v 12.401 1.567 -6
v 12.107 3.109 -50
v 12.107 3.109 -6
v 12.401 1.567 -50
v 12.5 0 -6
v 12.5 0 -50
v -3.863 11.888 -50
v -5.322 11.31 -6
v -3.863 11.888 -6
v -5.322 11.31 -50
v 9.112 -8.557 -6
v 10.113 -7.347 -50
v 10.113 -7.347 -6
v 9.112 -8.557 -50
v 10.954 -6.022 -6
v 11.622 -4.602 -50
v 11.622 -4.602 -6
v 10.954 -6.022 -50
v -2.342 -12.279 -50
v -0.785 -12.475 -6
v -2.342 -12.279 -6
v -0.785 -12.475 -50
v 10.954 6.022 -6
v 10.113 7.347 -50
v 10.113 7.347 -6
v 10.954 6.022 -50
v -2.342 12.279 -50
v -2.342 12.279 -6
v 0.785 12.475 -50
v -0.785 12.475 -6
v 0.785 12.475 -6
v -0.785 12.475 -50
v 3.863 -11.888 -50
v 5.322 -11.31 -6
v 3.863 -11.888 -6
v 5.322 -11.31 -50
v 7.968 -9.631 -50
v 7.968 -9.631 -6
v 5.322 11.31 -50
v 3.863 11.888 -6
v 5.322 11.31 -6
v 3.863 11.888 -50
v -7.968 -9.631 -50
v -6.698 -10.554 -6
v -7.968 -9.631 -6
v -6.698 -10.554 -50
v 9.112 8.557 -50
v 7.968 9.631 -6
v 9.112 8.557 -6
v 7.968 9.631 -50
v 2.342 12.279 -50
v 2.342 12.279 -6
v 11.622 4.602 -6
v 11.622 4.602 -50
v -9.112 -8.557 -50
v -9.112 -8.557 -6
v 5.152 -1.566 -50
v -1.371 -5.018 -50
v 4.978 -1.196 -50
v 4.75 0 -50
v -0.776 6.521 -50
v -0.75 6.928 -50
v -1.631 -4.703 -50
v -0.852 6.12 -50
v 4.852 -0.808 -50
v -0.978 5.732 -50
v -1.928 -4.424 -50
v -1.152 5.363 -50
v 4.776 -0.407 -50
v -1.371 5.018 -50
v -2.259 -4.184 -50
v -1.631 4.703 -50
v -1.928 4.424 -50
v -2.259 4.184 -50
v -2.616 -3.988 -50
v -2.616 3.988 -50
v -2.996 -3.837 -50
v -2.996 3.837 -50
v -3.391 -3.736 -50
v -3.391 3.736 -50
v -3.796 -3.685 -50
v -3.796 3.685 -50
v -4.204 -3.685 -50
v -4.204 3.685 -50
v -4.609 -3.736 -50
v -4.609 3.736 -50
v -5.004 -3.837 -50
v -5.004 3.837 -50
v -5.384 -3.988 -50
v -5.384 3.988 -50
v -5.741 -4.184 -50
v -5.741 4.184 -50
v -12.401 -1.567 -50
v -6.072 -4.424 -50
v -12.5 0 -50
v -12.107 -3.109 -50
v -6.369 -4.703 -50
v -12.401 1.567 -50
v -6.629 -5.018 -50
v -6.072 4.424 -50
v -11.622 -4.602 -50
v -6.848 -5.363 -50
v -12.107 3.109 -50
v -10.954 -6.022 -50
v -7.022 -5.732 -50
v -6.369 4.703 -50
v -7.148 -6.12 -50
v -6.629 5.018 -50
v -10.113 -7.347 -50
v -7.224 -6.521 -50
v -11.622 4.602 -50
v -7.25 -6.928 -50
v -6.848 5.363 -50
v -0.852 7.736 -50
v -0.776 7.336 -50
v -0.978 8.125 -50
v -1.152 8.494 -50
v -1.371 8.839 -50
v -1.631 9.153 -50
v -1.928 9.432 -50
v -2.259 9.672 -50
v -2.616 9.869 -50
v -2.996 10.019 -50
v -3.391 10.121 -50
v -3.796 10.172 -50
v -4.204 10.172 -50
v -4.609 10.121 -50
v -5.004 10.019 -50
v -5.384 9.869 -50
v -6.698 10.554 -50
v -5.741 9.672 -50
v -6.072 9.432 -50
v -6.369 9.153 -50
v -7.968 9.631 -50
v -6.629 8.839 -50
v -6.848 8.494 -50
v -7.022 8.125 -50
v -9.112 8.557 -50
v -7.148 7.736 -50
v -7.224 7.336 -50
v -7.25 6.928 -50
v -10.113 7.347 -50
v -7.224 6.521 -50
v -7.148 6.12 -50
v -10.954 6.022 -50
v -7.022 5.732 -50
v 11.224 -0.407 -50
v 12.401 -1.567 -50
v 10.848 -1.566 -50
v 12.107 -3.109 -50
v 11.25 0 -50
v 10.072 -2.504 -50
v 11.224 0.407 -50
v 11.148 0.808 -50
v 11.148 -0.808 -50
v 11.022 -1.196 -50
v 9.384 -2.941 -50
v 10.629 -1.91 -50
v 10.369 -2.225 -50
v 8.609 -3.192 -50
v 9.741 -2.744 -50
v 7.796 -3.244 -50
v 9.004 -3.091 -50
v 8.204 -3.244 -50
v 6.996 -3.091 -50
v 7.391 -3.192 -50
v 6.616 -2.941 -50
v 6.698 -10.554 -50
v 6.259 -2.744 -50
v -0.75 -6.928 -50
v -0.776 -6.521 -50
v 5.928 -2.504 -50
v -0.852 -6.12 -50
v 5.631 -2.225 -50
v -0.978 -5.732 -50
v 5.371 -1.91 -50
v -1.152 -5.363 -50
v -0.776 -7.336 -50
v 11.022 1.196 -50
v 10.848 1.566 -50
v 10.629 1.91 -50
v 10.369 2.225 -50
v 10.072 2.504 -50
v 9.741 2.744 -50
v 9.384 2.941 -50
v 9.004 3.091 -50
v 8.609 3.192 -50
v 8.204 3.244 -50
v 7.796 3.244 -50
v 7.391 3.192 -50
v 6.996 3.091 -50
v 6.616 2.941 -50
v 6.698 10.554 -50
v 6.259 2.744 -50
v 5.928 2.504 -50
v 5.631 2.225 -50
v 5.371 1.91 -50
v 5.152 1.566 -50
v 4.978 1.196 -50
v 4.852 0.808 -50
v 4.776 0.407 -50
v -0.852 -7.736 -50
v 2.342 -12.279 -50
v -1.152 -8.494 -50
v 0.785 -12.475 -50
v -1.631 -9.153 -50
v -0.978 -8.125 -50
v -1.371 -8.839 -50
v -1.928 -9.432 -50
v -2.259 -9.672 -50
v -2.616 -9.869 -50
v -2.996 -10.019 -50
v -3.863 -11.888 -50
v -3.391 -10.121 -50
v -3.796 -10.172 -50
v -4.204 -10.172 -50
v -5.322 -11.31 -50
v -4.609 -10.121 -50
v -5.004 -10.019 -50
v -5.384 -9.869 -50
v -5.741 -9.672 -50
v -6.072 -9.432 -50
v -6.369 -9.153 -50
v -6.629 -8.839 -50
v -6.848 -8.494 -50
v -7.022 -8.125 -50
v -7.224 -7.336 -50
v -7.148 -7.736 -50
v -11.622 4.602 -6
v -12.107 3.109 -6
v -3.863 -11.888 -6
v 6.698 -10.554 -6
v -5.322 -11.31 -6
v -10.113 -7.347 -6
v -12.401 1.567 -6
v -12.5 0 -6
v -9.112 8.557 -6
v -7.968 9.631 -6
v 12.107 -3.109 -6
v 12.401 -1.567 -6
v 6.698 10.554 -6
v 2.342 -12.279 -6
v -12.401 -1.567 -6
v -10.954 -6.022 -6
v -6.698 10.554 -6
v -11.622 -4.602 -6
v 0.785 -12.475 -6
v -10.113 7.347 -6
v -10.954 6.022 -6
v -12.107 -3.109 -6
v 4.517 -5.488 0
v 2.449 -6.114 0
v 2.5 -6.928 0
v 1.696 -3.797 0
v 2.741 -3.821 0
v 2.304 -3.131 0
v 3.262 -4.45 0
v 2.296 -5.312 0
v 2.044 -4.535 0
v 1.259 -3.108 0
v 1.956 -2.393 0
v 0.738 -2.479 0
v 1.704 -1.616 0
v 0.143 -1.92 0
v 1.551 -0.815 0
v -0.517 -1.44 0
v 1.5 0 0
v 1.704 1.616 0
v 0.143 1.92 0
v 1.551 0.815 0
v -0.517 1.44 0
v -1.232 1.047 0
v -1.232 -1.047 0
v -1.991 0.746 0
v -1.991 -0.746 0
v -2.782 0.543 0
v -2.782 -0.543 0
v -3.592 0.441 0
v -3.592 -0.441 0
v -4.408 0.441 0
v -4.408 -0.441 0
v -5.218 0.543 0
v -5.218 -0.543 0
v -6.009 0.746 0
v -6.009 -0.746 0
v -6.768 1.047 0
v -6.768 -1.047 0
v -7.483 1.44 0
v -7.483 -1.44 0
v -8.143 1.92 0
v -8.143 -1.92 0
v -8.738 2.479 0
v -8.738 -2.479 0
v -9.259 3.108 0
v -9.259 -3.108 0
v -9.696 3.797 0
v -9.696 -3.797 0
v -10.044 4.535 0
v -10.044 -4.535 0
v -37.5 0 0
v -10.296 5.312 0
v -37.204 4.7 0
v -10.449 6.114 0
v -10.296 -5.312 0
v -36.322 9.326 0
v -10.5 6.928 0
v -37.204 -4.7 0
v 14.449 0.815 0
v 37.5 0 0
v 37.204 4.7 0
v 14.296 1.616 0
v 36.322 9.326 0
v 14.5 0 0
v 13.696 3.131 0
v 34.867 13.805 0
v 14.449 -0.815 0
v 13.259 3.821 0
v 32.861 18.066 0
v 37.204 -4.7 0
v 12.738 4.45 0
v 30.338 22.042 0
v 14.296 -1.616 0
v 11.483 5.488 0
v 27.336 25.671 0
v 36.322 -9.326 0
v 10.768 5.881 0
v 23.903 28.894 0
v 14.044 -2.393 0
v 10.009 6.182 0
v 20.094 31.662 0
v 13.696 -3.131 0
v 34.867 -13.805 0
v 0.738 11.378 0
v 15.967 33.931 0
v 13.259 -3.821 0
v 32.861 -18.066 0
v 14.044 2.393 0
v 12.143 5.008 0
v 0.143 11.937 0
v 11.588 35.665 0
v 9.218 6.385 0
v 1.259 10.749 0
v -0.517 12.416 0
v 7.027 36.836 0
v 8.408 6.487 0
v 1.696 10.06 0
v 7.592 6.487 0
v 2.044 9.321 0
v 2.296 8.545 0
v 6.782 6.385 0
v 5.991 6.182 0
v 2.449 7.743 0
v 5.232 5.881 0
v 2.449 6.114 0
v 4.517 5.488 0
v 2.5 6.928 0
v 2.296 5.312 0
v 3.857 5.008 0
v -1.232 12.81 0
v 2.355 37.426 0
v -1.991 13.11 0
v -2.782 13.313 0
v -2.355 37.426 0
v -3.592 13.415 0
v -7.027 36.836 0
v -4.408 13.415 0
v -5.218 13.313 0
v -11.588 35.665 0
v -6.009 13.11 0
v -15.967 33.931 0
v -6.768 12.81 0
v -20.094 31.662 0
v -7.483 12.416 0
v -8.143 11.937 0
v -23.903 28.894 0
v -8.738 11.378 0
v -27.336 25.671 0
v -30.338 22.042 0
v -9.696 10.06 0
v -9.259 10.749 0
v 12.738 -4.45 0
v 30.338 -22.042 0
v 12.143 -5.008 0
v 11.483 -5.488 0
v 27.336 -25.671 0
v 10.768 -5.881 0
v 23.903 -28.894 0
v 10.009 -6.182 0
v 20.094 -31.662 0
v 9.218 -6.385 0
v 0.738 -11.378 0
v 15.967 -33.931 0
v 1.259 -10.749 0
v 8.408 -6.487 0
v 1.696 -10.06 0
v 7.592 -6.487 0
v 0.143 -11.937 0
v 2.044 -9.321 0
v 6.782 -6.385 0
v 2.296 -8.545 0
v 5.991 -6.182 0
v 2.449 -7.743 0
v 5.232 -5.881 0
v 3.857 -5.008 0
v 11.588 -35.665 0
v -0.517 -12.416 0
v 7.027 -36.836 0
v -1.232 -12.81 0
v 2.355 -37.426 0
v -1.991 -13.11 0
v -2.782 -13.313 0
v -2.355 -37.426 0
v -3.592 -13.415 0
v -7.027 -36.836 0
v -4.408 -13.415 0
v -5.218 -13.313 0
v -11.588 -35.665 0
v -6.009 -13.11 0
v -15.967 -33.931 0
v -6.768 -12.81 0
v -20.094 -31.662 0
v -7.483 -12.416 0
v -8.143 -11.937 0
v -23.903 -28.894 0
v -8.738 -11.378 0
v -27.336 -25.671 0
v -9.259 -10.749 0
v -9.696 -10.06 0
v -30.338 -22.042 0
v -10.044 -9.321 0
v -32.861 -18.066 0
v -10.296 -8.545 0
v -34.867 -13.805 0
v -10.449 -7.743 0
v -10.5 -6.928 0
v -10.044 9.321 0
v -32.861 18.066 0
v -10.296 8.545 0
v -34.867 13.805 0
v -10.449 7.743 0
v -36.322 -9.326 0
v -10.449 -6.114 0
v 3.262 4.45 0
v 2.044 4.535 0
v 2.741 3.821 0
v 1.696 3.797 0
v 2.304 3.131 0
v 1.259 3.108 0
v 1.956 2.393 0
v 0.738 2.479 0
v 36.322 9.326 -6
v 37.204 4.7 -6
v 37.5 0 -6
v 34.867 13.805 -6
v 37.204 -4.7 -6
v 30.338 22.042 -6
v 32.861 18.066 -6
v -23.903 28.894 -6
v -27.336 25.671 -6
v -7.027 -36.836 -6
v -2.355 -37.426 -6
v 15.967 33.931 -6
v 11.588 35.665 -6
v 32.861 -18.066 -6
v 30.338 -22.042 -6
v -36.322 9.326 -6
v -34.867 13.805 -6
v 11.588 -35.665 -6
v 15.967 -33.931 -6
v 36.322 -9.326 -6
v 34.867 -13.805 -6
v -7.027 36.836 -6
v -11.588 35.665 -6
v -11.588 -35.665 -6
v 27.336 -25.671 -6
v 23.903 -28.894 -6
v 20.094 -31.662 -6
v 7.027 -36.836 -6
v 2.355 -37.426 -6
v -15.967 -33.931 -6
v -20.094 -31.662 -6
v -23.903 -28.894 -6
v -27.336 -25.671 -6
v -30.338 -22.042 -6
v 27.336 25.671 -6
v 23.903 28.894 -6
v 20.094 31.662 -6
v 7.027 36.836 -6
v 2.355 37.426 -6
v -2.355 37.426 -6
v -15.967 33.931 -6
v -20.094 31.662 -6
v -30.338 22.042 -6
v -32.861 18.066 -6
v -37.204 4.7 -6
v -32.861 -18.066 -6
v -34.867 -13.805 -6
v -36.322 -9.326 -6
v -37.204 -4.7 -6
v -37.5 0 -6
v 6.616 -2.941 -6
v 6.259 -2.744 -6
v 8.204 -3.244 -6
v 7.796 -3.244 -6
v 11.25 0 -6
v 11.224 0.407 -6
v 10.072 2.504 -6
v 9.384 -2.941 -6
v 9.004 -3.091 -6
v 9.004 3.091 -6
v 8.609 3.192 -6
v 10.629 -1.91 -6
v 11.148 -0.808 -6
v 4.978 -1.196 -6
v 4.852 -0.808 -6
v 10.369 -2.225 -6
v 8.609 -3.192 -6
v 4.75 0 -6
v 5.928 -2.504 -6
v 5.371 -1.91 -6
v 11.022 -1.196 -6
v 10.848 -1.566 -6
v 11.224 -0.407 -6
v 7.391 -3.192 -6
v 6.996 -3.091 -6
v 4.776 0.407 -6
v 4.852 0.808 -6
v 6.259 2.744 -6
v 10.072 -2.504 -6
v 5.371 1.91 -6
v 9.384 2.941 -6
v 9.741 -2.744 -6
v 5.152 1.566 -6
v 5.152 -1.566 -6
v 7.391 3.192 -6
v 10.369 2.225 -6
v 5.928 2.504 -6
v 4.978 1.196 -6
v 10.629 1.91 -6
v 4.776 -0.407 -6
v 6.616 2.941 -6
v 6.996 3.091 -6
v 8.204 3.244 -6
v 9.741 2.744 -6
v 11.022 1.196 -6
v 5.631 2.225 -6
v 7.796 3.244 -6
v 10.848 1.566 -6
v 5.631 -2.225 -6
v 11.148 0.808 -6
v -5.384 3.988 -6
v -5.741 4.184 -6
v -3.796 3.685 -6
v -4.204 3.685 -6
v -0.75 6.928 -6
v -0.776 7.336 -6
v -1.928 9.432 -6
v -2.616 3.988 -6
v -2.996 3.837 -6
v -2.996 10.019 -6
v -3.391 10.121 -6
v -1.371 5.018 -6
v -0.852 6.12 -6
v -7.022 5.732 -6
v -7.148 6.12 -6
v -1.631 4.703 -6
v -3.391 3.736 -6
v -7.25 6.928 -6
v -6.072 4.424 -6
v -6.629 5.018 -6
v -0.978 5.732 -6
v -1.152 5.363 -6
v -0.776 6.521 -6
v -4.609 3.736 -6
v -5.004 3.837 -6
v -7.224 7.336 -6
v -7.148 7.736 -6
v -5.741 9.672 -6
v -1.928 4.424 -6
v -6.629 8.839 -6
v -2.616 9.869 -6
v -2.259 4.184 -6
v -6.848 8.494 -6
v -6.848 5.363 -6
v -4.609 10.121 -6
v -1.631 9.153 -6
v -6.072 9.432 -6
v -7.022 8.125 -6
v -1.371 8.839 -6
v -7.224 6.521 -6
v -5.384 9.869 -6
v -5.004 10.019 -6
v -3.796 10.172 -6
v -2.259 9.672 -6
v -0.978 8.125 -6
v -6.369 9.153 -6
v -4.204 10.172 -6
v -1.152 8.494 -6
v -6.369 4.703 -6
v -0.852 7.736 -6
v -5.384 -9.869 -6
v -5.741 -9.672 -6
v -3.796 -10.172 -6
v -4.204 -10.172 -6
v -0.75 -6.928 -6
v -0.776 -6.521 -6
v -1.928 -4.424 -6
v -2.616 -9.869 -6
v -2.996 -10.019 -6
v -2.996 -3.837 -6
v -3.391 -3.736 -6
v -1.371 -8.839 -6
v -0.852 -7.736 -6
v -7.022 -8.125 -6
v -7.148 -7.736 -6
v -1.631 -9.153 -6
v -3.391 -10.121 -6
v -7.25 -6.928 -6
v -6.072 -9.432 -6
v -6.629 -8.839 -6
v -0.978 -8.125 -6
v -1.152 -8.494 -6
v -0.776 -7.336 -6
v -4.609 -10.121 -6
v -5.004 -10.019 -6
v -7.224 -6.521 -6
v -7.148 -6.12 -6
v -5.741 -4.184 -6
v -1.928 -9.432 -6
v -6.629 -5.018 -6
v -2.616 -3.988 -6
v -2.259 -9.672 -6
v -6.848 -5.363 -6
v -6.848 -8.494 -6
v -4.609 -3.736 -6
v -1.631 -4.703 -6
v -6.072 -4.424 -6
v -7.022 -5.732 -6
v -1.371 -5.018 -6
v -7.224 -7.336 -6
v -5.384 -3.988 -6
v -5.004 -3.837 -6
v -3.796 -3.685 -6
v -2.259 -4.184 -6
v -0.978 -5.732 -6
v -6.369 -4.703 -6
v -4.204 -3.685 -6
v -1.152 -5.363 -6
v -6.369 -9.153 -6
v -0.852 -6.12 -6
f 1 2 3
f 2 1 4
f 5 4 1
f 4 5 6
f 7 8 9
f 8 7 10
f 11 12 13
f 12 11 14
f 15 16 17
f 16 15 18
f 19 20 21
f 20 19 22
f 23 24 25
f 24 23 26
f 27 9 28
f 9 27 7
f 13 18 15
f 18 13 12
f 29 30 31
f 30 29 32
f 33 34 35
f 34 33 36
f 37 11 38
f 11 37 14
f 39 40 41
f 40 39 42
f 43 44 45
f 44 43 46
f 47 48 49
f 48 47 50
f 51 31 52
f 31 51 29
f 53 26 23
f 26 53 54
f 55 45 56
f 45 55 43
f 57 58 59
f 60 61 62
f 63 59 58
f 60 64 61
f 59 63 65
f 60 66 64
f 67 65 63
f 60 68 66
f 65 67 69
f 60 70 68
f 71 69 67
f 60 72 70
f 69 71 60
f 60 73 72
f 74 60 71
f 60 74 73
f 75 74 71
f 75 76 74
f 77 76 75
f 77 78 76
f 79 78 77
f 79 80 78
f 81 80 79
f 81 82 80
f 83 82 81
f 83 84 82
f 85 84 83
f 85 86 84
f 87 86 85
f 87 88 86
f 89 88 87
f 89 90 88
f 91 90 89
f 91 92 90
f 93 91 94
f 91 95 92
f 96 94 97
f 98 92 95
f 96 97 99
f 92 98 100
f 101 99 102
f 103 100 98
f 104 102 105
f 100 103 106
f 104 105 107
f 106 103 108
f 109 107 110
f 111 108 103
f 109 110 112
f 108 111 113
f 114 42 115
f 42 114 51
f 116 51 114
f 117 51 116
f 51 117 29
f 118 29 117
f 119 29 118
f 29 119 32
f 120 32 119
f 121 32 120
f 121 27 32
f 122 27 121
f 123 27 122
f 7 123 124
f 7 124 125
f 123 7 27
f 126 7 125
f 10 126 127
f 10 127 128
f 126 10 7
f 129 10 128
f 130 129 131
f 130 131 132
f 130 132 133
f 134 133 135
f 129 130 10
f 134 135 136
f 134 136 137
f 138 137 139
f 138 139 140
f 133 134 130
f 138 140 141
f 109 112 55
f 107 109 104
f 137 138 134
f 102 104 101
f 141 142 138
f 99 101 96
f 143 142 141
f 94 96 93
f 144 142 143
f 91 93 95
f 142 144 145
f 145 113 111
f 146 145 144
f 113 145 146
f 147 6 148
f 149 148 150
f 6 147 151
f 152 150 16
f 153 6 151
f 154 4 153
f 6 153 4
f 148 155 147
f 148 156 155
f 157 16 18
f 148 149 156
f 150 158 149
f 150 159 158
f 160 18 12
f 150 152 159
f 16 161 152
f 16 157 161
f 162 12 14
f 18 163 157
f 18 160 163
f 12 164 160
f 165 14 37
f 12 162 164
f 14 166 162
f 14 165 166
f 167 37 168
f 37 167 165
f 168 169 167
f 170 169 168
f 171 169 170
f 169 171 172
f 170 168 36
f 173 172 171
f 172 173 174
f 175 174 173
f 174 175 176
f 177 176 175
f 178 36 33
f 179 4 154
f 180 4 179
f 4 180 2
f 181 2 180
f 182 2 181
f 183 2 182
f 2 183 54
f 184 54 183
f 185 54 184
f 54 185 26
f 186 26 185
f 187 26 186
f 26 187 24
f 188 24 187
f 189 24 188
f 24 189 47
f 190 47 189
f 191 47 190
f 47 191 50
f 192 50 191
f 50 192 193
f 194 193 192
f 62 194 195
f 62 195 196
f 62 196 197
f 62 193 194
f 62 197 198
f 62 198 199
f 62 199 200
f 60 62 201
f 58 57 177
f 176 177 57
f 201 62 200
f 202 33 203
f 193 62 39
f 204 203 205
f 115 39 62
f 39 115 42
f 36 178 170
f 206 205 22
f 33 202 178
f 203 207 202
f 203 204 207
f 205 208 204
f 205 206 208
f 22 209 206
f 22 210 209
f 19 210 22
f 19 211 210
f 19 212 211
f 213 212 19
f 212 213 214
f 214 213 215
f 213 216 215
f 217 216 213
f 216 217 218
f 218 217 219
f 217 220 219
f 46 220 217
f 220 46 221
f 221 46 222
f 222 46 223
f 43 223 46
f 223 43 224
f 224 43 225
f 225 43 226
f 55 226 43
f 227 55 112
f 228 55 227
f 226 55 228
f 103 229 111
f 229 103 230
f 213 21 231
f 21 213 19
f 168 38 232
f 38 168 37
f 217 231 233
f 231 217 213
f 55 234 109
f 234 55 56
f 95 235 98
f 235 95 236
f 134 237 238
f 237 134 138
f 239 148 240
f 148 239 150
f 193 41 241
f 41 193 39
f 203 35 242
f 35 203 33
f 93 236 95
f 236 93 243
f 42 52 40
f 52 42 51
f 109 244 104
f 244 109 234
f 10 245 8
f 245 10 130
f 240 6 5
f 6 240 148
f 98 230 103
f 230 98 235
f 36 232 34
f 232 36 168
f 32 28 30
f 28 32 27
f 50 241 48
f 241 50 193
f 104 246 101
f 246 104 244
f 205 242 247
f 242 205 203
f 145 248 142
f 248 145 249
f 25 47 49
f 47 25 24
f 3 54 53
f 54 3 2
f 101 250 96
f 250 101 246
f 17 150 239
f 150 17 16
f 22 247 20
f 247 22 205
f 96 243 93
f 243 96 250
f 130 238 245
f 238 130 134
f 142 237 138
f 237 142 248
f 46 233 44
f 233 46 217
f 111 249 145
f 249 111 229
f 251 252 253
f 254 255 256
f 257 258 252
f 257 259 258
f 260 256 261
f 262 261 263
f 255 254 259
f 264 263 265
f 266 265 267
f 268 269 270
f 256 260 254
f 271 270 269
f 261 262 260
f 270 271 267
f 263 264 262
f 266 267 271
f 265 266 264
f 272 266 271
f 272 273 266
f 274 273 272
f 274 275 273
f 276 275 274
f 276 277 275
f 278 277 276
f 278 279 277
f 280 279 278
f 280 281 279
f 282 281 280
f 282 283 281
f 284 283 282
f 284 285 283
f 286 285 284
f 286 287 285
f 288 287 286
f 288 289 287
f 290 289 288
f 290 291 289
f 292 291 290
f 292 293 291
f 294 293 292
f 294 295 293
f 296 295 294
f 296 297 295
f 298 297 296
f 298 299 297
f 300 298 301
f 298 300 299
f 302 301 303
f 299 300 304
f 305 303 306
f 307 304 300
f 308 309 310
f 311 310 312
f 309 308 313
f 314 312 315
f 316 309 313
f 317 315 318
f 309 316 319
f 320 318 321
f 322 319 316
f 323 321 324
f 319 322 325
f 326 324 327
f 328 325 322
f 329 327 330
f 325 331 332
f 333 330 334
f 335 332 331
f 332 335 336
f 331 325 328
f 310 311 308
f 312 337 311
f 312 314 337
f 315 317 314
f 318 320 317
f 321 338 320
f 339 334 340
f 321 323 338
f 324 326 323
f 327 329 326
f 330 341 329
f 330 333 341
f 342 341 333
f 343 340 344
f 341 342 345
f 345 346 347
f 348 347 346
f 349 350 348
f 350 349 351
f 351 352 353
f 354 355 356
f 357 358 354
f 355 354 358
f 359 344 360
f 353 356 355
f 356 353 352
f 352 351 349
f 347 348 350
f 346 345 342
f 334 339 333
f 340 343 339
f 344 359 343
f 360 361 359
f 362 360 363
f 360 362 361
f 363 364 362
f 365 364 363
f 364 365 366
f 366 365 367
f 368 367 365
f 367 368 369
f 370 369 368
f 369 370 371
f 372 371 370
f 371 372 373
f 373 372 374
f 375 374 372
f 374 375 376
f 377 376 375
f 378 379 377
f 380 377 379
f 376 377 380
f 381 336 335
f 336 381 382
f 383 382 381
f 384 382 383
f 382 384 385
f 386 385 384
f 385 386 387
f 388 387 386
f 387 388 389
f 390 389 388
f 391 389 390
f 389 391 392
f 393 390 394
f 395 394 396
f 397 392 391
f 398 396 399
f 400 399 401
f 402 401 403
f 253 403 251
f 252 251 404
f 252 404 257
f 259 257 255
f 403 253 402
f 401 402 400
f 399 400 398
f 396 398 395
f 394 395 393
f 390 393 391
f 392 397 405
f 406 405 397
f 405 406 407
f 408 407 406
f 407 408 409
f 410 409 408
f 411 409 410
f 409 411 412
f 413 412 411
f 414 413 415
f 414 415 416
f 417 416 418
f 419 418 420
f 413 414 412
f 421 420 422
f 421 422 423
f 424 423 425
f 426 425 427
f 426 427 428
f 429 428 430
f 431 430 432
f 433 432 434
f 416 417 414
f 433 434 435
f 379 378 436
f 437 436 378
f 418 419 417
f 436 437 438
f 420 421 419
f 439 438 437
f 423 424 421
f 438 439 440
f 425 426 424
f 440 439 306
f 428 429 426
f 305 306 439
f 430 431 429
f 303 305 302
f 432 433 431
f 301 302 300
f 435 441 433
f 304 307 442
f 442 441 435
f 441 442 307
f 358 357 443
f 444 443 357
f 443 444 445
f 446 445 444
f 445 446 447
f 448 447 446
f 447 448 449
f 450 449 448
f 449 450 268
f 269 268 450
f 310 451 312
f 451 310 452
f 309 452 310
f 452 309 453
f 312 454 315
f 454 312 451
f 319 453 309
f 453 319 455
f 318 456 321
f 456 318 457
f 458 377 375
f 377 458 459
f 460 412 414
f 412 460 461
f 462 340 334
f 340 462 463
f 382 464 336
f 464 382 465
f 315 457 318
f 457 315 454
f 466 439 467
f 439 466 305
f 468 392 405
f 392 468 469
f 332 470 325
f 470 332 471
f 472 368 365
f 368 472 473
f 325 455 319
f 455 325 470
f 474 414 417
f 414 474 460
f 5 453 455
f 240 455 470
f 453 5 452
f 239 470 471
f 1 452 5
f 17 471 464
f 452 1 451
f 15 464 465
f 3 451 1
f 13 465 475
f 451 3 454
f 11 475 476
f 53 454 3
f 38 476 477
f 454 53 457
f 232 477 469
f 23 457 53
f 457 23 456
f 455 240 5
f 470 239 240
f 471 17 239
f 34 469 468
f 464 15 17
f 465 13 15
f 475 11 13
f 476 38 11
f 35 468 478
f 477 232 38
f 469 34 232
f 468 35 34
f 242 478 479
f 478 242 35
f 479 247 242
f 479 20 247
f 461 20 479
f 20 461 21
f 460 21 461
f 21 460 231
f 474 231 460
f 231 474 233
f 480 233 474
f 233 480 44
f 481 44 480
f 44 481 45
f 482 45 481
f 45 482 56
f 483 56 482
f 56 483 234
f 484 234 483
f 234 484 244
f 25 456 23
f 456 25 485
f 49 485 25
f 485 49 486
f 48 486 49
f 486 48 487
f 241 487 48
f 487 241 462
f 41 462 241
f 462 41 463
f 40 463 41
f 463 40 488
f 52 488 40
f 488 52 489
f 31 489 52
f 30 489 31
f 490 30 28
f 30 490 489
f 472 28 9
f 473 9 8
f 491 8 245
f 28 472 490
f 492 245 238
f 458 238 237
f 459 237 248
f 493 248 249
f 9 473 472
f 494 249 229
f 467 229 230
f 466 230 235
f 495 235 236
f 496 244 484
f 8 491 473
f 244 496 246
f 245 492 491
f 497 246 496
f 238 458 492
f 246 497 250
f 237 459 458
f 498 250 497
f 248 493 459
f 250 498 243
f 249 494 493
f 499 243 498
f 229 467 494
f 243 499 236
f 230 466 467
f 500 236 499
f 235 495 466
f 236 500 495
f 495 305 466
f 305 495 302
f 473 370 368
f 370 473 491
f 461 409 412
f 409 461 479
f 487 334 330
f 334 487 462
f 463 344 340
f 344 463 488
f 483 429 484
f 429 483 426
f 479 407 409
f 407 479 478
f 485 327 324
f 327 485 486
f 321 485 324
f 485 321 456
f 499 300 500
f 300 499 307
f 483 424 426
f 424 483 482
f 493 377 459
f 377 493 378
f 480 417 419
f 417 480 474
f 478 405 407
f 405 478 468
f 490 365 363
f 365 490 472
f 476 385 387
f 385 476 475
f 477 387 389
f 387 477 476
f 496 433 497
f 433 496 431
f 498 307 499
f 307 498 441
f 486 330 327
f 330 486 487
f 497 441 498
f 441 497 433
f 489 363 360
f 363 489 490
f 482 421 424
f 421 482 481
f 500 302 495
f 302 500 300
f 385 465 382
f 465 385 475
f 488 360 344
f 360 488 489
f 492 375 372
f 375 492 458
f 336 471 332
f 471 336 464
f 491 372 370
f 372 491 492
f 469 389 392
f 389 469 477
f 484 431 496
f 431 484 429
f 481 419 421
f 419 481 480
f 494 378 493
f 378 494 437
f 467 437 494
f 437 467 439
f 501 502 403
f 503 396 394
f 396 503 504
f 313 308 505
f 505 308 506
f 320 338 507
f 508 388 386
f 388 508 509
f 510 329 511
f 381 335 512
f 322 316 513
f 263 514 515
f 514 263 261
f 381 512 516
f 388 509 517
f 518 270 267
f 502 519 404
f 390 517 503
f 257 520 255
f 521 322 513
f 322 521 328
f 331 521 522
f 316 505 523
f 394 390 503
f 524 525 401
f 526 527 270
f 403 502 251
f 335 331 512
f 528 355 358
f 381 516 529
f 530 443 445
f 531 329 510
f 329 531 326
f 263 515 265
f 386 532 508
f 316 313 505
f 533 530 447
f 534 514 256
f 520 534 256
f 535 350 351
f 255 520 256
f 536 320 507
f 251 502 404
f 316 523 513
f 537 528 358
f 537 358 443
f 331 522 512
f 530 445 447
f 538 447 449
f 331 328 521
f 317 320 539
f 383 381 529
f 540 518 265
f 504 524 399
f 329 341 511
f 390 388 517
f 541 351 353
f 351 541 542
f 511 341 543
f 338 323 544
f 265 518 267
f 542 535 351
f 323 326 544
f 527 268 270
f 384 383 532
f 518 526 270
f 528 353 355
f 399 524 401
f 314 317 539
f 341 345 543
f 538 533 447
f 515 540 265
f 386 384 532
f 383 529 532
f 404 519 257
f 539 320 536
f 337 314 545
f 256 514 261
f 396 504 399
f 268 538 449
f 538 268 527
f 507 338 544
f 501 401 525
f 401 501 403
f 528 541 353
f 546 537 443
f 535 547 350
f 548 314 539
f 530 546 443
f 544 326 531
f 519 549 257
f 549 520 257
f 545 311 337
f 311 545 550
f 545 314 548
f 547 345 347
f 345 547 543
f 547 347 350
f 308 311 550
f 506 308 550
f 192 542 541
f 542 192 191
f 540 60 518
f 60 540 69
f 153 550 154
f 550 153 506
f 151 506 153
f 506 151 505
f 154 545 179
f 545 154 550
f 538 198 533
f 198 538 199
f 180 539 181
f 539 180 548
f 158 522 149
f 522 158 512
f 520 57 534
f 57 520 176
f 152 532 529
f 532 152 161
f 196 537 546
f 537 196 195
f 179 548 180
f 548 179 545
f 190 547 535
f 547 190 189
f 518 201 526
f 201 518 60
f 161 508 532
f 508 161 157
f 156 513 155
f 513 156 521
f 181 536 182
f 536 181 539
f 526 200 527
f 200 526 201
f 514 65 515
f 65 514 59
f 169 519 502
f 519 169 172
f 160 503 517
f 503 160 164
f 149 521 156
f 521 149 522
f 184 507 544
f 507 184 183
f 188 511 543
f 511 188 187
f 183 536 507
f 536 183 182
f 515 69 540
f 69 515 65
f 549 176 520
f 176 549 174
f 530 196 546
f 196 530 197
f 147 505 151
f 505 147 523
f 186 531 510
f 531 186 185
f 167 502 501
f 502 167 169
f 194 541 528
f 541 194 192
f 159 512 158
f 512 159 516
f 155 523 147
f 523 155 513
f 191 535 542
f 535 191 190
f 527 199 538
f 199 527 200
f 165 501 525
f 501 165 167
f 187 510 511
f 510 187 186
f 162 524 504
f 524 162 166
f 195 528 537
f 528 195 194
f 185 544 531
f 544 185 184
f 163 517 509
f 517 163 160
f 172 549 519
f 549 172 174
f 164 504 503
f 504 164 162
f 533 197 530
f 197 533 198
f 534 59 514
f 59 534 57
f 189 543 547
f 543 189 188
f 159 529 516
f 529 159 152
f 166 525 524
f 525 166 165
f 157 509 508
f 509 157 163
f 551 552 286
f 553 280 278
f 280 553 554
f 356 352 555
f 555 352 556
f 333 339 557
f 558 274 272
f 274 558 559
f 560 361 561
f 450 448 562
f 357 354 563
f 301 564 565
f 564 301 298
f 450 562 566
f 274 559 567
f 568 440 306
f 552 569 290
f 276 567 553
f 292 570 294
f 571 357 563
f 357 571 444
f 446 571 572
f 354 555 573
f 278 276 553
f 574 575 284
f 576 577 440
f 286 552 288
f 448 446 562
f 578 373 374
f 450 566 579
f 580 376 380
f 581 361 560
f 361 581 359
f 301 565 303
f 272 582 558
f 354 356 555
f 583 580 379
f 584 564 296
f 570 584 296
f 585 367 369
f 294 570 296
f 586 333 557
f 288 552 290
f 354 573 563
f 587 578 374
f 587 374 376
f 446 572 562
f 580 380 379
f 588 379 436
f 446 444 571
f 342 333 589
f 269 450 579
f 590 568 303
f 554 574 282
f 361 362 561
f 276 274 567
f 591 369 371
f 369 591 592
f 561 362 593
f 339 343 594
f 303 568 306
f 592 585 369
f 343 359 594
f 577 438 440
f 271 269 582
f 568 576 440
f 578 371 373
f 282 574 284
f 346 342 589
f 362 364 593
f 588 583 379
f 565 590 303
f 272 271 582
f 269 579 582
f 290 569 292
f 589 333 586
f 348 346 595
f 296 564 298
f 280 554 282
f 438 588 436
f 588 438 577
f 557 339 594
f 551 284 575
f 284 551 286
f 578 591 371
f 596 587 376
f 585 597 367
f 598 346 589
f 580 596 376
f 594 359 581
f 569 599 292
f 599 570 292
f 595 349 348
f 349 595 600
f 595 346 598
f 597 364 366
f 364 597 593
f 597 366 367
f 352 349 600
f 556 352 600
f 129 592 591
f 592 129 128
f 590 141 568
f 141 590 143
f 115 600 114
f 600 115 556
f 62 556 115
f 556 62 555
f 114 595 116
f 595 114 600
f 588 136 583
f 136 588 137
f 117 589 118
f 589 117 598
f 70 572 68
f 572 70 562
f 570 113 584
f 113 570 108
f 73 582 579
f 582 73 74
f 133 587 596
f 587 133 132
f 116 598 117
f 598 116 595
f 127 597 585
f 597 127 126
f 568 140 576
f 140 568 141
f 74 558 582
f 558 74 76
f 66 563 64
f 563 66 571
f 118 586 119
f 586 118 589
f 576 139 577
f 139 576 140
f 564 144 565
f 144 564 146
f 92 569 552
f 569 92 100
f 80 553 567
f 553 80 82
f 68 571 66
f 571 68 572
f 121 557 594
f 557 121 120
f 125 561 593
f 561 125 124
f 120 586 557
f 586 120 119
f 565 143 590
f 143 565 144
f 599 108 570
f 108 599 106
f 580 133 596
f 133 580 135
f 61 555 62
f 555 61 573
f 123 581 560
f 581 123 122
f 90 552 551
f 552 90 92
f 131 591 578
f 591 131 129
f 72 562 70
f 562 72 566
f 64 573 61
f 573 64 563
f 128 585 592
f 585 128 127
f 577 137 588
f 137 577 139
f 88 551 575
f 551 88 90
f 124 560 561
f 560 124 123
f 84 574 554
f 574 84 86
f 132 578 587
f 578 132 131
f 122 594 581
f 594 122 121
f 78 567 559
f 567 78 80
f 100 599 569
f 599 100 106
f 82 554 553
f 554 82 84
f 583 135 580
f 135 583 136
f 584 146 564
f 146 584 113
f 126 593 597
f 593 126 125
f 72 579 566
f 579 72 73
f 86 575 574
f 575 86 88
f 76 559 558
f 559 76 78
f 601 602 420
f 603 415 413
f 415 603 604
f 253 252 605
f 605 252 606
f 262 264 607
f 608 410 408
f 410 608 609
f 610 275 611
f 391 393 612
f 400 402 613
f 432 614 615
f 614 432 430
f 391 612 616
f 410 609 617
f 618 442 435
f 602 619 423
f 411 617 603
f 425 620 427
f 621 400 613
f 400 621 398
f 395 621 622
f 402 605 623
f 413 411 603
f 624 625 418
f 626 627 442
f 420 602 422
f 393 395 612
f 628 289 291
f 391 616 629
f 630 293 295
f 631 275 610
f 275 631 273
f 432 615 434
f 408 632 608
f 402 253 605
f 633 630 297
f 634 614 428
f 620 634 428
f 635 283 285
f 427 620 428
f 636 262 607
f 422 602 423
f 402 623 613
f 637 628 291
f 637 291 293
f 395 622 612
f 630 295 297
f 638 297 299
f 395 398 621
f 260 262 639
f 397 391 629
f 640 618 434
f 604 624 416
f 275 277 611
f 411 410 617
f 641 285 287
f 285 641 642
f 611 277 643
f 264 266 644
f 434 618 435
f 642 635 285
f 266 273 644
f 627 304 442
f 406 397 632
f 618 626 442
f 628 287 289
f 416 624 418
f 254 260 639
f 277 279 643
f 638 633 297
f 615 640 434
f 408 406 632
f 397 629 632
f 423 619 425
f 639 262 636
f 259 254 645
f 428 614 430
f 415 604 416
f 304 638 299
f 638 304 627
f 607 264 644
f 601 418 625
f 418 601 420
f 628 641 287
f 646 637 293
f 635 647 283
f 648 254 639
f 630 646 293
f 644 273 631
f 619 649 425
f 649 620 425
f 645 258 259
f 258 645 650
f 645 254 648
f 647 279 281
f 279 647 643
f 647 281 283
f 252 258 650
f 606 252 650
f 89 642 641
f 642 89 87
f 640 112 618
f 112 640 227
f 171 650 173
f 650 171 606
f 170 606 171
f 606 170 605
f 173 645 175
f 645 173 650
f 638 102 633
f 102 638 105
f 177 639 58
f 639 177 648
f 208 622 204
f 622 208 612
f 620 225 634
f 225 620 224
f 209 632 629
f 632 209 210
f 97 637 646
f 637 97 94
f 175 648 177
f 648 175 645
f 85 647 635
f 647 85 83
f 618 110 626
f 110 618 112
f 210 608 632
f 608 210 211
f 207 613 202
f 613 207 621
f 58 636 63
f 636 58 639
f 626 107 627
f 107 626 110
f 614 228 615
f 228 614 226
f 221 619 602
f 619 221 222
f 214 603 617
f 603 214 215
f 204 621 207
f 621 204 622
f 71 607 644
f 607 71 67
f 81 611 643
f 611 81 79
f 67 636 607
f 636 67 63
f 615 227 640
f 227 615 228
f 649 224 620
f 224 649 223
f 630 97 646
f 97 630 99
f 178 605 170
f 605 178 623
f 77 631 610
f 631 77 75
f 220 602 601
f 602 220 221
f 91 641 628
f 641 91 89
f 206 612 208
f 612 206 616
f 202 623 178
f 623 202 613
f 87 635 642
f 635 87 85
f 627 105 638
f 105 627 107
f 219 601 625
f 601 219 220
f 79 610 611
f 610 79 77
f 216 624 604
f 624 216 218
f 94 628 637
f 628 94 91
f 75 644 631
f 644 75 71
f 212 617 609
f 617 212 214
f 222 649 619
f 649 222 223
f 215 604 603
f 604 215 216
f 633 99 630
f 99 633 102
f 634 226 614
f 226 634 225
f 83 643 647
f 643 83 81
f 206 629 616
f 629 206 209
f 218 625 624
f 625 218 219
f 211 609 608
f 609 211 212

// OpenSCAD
$fn = 50;


difference() {
	union() {
		translate(v = [0, 0, -50.0000000000]) {
			cylinder(h = 50, r = 12.5000000000);
		}
		translate(v = [0, 0, -6.0000000000]) {
			cylinder(h = 6, r = 37.5000000000);
		}
	}
	union() {
		translate(v = [8.0000000000, 0.0000000000, 0]) {
			rotate(a = [0, 0, 0]) {
				difference() {
					union() {
						#translate(v = [0, 0, -50.0000000000]) {
							cylinder(h = 50, r = 2.2500000000);
						}
						#translate(v = [0, 0, -6]) {
							cylinder(h = 6, r = 12.5000000000, r1 = 3.2500000000, r2 = 6.5000000000);
						}
						#translate(v = [0, 0, -50.0000000000]) {
							cylinder(h = 50, r = 3.2500000000);
						}
						#translate(v = [0, 0, -50.0000000000]) {
							cylinder(h = 50, r = 2.2500000000);
						}
					}
					union();
				}
			}
		}
		translate(v = [-4.0000000000, 6.9282032303, 0]) {
			rotate(a = [0, 0, 0]) {
				difference() {
					union() {
						#translate(v = [0, 0, -50.0000000000]) {
							cylinder(h = 50, r = 2.2500000000);
						}
						#translate(v = [0, 0, -6]) {
							cylinder(h = 6, r = 12.5000000000, r1 = 3.2500000000, r2 = 6.5000000000);
						}
						#translate(v = [0, 0, -50.0000000000]) {
							cylinder(h = 50, r = 3.2500000000);
						}
						#translate(v = [0, 0, -50.0000000000]) {
							cylinder(h = 50, r = 2.2500000000);
						}
					}
					union();
				}
			}
		}
		translate(v = [-4.0000000000, -6.9282032303, 0]) {
			rotate(a = [0, 0, 0]) {
				difference() {
					union() {
						#translate(v = [0, 0, -50.0000000000]) {
							cylinder(h = 50, r = 2.2500000000);
						}
						#translate(v = [0, 0, -6]) {
							cylinder(h = 6, r = 12.5000000000, r1 = 3.2500000000, r2 = 6.5000000000);
						}
						#translate(v = [0, 0, -50.0000000000]) {
							cylinder(h = 50, r = 3.2500000000);
						}
						#translate(v = [0, 0, -50.0000000000]) {
							cylinder(h = 50, r = 2.2500000000);
						}
					}
					union();
				}
			}
		}
	}
}
